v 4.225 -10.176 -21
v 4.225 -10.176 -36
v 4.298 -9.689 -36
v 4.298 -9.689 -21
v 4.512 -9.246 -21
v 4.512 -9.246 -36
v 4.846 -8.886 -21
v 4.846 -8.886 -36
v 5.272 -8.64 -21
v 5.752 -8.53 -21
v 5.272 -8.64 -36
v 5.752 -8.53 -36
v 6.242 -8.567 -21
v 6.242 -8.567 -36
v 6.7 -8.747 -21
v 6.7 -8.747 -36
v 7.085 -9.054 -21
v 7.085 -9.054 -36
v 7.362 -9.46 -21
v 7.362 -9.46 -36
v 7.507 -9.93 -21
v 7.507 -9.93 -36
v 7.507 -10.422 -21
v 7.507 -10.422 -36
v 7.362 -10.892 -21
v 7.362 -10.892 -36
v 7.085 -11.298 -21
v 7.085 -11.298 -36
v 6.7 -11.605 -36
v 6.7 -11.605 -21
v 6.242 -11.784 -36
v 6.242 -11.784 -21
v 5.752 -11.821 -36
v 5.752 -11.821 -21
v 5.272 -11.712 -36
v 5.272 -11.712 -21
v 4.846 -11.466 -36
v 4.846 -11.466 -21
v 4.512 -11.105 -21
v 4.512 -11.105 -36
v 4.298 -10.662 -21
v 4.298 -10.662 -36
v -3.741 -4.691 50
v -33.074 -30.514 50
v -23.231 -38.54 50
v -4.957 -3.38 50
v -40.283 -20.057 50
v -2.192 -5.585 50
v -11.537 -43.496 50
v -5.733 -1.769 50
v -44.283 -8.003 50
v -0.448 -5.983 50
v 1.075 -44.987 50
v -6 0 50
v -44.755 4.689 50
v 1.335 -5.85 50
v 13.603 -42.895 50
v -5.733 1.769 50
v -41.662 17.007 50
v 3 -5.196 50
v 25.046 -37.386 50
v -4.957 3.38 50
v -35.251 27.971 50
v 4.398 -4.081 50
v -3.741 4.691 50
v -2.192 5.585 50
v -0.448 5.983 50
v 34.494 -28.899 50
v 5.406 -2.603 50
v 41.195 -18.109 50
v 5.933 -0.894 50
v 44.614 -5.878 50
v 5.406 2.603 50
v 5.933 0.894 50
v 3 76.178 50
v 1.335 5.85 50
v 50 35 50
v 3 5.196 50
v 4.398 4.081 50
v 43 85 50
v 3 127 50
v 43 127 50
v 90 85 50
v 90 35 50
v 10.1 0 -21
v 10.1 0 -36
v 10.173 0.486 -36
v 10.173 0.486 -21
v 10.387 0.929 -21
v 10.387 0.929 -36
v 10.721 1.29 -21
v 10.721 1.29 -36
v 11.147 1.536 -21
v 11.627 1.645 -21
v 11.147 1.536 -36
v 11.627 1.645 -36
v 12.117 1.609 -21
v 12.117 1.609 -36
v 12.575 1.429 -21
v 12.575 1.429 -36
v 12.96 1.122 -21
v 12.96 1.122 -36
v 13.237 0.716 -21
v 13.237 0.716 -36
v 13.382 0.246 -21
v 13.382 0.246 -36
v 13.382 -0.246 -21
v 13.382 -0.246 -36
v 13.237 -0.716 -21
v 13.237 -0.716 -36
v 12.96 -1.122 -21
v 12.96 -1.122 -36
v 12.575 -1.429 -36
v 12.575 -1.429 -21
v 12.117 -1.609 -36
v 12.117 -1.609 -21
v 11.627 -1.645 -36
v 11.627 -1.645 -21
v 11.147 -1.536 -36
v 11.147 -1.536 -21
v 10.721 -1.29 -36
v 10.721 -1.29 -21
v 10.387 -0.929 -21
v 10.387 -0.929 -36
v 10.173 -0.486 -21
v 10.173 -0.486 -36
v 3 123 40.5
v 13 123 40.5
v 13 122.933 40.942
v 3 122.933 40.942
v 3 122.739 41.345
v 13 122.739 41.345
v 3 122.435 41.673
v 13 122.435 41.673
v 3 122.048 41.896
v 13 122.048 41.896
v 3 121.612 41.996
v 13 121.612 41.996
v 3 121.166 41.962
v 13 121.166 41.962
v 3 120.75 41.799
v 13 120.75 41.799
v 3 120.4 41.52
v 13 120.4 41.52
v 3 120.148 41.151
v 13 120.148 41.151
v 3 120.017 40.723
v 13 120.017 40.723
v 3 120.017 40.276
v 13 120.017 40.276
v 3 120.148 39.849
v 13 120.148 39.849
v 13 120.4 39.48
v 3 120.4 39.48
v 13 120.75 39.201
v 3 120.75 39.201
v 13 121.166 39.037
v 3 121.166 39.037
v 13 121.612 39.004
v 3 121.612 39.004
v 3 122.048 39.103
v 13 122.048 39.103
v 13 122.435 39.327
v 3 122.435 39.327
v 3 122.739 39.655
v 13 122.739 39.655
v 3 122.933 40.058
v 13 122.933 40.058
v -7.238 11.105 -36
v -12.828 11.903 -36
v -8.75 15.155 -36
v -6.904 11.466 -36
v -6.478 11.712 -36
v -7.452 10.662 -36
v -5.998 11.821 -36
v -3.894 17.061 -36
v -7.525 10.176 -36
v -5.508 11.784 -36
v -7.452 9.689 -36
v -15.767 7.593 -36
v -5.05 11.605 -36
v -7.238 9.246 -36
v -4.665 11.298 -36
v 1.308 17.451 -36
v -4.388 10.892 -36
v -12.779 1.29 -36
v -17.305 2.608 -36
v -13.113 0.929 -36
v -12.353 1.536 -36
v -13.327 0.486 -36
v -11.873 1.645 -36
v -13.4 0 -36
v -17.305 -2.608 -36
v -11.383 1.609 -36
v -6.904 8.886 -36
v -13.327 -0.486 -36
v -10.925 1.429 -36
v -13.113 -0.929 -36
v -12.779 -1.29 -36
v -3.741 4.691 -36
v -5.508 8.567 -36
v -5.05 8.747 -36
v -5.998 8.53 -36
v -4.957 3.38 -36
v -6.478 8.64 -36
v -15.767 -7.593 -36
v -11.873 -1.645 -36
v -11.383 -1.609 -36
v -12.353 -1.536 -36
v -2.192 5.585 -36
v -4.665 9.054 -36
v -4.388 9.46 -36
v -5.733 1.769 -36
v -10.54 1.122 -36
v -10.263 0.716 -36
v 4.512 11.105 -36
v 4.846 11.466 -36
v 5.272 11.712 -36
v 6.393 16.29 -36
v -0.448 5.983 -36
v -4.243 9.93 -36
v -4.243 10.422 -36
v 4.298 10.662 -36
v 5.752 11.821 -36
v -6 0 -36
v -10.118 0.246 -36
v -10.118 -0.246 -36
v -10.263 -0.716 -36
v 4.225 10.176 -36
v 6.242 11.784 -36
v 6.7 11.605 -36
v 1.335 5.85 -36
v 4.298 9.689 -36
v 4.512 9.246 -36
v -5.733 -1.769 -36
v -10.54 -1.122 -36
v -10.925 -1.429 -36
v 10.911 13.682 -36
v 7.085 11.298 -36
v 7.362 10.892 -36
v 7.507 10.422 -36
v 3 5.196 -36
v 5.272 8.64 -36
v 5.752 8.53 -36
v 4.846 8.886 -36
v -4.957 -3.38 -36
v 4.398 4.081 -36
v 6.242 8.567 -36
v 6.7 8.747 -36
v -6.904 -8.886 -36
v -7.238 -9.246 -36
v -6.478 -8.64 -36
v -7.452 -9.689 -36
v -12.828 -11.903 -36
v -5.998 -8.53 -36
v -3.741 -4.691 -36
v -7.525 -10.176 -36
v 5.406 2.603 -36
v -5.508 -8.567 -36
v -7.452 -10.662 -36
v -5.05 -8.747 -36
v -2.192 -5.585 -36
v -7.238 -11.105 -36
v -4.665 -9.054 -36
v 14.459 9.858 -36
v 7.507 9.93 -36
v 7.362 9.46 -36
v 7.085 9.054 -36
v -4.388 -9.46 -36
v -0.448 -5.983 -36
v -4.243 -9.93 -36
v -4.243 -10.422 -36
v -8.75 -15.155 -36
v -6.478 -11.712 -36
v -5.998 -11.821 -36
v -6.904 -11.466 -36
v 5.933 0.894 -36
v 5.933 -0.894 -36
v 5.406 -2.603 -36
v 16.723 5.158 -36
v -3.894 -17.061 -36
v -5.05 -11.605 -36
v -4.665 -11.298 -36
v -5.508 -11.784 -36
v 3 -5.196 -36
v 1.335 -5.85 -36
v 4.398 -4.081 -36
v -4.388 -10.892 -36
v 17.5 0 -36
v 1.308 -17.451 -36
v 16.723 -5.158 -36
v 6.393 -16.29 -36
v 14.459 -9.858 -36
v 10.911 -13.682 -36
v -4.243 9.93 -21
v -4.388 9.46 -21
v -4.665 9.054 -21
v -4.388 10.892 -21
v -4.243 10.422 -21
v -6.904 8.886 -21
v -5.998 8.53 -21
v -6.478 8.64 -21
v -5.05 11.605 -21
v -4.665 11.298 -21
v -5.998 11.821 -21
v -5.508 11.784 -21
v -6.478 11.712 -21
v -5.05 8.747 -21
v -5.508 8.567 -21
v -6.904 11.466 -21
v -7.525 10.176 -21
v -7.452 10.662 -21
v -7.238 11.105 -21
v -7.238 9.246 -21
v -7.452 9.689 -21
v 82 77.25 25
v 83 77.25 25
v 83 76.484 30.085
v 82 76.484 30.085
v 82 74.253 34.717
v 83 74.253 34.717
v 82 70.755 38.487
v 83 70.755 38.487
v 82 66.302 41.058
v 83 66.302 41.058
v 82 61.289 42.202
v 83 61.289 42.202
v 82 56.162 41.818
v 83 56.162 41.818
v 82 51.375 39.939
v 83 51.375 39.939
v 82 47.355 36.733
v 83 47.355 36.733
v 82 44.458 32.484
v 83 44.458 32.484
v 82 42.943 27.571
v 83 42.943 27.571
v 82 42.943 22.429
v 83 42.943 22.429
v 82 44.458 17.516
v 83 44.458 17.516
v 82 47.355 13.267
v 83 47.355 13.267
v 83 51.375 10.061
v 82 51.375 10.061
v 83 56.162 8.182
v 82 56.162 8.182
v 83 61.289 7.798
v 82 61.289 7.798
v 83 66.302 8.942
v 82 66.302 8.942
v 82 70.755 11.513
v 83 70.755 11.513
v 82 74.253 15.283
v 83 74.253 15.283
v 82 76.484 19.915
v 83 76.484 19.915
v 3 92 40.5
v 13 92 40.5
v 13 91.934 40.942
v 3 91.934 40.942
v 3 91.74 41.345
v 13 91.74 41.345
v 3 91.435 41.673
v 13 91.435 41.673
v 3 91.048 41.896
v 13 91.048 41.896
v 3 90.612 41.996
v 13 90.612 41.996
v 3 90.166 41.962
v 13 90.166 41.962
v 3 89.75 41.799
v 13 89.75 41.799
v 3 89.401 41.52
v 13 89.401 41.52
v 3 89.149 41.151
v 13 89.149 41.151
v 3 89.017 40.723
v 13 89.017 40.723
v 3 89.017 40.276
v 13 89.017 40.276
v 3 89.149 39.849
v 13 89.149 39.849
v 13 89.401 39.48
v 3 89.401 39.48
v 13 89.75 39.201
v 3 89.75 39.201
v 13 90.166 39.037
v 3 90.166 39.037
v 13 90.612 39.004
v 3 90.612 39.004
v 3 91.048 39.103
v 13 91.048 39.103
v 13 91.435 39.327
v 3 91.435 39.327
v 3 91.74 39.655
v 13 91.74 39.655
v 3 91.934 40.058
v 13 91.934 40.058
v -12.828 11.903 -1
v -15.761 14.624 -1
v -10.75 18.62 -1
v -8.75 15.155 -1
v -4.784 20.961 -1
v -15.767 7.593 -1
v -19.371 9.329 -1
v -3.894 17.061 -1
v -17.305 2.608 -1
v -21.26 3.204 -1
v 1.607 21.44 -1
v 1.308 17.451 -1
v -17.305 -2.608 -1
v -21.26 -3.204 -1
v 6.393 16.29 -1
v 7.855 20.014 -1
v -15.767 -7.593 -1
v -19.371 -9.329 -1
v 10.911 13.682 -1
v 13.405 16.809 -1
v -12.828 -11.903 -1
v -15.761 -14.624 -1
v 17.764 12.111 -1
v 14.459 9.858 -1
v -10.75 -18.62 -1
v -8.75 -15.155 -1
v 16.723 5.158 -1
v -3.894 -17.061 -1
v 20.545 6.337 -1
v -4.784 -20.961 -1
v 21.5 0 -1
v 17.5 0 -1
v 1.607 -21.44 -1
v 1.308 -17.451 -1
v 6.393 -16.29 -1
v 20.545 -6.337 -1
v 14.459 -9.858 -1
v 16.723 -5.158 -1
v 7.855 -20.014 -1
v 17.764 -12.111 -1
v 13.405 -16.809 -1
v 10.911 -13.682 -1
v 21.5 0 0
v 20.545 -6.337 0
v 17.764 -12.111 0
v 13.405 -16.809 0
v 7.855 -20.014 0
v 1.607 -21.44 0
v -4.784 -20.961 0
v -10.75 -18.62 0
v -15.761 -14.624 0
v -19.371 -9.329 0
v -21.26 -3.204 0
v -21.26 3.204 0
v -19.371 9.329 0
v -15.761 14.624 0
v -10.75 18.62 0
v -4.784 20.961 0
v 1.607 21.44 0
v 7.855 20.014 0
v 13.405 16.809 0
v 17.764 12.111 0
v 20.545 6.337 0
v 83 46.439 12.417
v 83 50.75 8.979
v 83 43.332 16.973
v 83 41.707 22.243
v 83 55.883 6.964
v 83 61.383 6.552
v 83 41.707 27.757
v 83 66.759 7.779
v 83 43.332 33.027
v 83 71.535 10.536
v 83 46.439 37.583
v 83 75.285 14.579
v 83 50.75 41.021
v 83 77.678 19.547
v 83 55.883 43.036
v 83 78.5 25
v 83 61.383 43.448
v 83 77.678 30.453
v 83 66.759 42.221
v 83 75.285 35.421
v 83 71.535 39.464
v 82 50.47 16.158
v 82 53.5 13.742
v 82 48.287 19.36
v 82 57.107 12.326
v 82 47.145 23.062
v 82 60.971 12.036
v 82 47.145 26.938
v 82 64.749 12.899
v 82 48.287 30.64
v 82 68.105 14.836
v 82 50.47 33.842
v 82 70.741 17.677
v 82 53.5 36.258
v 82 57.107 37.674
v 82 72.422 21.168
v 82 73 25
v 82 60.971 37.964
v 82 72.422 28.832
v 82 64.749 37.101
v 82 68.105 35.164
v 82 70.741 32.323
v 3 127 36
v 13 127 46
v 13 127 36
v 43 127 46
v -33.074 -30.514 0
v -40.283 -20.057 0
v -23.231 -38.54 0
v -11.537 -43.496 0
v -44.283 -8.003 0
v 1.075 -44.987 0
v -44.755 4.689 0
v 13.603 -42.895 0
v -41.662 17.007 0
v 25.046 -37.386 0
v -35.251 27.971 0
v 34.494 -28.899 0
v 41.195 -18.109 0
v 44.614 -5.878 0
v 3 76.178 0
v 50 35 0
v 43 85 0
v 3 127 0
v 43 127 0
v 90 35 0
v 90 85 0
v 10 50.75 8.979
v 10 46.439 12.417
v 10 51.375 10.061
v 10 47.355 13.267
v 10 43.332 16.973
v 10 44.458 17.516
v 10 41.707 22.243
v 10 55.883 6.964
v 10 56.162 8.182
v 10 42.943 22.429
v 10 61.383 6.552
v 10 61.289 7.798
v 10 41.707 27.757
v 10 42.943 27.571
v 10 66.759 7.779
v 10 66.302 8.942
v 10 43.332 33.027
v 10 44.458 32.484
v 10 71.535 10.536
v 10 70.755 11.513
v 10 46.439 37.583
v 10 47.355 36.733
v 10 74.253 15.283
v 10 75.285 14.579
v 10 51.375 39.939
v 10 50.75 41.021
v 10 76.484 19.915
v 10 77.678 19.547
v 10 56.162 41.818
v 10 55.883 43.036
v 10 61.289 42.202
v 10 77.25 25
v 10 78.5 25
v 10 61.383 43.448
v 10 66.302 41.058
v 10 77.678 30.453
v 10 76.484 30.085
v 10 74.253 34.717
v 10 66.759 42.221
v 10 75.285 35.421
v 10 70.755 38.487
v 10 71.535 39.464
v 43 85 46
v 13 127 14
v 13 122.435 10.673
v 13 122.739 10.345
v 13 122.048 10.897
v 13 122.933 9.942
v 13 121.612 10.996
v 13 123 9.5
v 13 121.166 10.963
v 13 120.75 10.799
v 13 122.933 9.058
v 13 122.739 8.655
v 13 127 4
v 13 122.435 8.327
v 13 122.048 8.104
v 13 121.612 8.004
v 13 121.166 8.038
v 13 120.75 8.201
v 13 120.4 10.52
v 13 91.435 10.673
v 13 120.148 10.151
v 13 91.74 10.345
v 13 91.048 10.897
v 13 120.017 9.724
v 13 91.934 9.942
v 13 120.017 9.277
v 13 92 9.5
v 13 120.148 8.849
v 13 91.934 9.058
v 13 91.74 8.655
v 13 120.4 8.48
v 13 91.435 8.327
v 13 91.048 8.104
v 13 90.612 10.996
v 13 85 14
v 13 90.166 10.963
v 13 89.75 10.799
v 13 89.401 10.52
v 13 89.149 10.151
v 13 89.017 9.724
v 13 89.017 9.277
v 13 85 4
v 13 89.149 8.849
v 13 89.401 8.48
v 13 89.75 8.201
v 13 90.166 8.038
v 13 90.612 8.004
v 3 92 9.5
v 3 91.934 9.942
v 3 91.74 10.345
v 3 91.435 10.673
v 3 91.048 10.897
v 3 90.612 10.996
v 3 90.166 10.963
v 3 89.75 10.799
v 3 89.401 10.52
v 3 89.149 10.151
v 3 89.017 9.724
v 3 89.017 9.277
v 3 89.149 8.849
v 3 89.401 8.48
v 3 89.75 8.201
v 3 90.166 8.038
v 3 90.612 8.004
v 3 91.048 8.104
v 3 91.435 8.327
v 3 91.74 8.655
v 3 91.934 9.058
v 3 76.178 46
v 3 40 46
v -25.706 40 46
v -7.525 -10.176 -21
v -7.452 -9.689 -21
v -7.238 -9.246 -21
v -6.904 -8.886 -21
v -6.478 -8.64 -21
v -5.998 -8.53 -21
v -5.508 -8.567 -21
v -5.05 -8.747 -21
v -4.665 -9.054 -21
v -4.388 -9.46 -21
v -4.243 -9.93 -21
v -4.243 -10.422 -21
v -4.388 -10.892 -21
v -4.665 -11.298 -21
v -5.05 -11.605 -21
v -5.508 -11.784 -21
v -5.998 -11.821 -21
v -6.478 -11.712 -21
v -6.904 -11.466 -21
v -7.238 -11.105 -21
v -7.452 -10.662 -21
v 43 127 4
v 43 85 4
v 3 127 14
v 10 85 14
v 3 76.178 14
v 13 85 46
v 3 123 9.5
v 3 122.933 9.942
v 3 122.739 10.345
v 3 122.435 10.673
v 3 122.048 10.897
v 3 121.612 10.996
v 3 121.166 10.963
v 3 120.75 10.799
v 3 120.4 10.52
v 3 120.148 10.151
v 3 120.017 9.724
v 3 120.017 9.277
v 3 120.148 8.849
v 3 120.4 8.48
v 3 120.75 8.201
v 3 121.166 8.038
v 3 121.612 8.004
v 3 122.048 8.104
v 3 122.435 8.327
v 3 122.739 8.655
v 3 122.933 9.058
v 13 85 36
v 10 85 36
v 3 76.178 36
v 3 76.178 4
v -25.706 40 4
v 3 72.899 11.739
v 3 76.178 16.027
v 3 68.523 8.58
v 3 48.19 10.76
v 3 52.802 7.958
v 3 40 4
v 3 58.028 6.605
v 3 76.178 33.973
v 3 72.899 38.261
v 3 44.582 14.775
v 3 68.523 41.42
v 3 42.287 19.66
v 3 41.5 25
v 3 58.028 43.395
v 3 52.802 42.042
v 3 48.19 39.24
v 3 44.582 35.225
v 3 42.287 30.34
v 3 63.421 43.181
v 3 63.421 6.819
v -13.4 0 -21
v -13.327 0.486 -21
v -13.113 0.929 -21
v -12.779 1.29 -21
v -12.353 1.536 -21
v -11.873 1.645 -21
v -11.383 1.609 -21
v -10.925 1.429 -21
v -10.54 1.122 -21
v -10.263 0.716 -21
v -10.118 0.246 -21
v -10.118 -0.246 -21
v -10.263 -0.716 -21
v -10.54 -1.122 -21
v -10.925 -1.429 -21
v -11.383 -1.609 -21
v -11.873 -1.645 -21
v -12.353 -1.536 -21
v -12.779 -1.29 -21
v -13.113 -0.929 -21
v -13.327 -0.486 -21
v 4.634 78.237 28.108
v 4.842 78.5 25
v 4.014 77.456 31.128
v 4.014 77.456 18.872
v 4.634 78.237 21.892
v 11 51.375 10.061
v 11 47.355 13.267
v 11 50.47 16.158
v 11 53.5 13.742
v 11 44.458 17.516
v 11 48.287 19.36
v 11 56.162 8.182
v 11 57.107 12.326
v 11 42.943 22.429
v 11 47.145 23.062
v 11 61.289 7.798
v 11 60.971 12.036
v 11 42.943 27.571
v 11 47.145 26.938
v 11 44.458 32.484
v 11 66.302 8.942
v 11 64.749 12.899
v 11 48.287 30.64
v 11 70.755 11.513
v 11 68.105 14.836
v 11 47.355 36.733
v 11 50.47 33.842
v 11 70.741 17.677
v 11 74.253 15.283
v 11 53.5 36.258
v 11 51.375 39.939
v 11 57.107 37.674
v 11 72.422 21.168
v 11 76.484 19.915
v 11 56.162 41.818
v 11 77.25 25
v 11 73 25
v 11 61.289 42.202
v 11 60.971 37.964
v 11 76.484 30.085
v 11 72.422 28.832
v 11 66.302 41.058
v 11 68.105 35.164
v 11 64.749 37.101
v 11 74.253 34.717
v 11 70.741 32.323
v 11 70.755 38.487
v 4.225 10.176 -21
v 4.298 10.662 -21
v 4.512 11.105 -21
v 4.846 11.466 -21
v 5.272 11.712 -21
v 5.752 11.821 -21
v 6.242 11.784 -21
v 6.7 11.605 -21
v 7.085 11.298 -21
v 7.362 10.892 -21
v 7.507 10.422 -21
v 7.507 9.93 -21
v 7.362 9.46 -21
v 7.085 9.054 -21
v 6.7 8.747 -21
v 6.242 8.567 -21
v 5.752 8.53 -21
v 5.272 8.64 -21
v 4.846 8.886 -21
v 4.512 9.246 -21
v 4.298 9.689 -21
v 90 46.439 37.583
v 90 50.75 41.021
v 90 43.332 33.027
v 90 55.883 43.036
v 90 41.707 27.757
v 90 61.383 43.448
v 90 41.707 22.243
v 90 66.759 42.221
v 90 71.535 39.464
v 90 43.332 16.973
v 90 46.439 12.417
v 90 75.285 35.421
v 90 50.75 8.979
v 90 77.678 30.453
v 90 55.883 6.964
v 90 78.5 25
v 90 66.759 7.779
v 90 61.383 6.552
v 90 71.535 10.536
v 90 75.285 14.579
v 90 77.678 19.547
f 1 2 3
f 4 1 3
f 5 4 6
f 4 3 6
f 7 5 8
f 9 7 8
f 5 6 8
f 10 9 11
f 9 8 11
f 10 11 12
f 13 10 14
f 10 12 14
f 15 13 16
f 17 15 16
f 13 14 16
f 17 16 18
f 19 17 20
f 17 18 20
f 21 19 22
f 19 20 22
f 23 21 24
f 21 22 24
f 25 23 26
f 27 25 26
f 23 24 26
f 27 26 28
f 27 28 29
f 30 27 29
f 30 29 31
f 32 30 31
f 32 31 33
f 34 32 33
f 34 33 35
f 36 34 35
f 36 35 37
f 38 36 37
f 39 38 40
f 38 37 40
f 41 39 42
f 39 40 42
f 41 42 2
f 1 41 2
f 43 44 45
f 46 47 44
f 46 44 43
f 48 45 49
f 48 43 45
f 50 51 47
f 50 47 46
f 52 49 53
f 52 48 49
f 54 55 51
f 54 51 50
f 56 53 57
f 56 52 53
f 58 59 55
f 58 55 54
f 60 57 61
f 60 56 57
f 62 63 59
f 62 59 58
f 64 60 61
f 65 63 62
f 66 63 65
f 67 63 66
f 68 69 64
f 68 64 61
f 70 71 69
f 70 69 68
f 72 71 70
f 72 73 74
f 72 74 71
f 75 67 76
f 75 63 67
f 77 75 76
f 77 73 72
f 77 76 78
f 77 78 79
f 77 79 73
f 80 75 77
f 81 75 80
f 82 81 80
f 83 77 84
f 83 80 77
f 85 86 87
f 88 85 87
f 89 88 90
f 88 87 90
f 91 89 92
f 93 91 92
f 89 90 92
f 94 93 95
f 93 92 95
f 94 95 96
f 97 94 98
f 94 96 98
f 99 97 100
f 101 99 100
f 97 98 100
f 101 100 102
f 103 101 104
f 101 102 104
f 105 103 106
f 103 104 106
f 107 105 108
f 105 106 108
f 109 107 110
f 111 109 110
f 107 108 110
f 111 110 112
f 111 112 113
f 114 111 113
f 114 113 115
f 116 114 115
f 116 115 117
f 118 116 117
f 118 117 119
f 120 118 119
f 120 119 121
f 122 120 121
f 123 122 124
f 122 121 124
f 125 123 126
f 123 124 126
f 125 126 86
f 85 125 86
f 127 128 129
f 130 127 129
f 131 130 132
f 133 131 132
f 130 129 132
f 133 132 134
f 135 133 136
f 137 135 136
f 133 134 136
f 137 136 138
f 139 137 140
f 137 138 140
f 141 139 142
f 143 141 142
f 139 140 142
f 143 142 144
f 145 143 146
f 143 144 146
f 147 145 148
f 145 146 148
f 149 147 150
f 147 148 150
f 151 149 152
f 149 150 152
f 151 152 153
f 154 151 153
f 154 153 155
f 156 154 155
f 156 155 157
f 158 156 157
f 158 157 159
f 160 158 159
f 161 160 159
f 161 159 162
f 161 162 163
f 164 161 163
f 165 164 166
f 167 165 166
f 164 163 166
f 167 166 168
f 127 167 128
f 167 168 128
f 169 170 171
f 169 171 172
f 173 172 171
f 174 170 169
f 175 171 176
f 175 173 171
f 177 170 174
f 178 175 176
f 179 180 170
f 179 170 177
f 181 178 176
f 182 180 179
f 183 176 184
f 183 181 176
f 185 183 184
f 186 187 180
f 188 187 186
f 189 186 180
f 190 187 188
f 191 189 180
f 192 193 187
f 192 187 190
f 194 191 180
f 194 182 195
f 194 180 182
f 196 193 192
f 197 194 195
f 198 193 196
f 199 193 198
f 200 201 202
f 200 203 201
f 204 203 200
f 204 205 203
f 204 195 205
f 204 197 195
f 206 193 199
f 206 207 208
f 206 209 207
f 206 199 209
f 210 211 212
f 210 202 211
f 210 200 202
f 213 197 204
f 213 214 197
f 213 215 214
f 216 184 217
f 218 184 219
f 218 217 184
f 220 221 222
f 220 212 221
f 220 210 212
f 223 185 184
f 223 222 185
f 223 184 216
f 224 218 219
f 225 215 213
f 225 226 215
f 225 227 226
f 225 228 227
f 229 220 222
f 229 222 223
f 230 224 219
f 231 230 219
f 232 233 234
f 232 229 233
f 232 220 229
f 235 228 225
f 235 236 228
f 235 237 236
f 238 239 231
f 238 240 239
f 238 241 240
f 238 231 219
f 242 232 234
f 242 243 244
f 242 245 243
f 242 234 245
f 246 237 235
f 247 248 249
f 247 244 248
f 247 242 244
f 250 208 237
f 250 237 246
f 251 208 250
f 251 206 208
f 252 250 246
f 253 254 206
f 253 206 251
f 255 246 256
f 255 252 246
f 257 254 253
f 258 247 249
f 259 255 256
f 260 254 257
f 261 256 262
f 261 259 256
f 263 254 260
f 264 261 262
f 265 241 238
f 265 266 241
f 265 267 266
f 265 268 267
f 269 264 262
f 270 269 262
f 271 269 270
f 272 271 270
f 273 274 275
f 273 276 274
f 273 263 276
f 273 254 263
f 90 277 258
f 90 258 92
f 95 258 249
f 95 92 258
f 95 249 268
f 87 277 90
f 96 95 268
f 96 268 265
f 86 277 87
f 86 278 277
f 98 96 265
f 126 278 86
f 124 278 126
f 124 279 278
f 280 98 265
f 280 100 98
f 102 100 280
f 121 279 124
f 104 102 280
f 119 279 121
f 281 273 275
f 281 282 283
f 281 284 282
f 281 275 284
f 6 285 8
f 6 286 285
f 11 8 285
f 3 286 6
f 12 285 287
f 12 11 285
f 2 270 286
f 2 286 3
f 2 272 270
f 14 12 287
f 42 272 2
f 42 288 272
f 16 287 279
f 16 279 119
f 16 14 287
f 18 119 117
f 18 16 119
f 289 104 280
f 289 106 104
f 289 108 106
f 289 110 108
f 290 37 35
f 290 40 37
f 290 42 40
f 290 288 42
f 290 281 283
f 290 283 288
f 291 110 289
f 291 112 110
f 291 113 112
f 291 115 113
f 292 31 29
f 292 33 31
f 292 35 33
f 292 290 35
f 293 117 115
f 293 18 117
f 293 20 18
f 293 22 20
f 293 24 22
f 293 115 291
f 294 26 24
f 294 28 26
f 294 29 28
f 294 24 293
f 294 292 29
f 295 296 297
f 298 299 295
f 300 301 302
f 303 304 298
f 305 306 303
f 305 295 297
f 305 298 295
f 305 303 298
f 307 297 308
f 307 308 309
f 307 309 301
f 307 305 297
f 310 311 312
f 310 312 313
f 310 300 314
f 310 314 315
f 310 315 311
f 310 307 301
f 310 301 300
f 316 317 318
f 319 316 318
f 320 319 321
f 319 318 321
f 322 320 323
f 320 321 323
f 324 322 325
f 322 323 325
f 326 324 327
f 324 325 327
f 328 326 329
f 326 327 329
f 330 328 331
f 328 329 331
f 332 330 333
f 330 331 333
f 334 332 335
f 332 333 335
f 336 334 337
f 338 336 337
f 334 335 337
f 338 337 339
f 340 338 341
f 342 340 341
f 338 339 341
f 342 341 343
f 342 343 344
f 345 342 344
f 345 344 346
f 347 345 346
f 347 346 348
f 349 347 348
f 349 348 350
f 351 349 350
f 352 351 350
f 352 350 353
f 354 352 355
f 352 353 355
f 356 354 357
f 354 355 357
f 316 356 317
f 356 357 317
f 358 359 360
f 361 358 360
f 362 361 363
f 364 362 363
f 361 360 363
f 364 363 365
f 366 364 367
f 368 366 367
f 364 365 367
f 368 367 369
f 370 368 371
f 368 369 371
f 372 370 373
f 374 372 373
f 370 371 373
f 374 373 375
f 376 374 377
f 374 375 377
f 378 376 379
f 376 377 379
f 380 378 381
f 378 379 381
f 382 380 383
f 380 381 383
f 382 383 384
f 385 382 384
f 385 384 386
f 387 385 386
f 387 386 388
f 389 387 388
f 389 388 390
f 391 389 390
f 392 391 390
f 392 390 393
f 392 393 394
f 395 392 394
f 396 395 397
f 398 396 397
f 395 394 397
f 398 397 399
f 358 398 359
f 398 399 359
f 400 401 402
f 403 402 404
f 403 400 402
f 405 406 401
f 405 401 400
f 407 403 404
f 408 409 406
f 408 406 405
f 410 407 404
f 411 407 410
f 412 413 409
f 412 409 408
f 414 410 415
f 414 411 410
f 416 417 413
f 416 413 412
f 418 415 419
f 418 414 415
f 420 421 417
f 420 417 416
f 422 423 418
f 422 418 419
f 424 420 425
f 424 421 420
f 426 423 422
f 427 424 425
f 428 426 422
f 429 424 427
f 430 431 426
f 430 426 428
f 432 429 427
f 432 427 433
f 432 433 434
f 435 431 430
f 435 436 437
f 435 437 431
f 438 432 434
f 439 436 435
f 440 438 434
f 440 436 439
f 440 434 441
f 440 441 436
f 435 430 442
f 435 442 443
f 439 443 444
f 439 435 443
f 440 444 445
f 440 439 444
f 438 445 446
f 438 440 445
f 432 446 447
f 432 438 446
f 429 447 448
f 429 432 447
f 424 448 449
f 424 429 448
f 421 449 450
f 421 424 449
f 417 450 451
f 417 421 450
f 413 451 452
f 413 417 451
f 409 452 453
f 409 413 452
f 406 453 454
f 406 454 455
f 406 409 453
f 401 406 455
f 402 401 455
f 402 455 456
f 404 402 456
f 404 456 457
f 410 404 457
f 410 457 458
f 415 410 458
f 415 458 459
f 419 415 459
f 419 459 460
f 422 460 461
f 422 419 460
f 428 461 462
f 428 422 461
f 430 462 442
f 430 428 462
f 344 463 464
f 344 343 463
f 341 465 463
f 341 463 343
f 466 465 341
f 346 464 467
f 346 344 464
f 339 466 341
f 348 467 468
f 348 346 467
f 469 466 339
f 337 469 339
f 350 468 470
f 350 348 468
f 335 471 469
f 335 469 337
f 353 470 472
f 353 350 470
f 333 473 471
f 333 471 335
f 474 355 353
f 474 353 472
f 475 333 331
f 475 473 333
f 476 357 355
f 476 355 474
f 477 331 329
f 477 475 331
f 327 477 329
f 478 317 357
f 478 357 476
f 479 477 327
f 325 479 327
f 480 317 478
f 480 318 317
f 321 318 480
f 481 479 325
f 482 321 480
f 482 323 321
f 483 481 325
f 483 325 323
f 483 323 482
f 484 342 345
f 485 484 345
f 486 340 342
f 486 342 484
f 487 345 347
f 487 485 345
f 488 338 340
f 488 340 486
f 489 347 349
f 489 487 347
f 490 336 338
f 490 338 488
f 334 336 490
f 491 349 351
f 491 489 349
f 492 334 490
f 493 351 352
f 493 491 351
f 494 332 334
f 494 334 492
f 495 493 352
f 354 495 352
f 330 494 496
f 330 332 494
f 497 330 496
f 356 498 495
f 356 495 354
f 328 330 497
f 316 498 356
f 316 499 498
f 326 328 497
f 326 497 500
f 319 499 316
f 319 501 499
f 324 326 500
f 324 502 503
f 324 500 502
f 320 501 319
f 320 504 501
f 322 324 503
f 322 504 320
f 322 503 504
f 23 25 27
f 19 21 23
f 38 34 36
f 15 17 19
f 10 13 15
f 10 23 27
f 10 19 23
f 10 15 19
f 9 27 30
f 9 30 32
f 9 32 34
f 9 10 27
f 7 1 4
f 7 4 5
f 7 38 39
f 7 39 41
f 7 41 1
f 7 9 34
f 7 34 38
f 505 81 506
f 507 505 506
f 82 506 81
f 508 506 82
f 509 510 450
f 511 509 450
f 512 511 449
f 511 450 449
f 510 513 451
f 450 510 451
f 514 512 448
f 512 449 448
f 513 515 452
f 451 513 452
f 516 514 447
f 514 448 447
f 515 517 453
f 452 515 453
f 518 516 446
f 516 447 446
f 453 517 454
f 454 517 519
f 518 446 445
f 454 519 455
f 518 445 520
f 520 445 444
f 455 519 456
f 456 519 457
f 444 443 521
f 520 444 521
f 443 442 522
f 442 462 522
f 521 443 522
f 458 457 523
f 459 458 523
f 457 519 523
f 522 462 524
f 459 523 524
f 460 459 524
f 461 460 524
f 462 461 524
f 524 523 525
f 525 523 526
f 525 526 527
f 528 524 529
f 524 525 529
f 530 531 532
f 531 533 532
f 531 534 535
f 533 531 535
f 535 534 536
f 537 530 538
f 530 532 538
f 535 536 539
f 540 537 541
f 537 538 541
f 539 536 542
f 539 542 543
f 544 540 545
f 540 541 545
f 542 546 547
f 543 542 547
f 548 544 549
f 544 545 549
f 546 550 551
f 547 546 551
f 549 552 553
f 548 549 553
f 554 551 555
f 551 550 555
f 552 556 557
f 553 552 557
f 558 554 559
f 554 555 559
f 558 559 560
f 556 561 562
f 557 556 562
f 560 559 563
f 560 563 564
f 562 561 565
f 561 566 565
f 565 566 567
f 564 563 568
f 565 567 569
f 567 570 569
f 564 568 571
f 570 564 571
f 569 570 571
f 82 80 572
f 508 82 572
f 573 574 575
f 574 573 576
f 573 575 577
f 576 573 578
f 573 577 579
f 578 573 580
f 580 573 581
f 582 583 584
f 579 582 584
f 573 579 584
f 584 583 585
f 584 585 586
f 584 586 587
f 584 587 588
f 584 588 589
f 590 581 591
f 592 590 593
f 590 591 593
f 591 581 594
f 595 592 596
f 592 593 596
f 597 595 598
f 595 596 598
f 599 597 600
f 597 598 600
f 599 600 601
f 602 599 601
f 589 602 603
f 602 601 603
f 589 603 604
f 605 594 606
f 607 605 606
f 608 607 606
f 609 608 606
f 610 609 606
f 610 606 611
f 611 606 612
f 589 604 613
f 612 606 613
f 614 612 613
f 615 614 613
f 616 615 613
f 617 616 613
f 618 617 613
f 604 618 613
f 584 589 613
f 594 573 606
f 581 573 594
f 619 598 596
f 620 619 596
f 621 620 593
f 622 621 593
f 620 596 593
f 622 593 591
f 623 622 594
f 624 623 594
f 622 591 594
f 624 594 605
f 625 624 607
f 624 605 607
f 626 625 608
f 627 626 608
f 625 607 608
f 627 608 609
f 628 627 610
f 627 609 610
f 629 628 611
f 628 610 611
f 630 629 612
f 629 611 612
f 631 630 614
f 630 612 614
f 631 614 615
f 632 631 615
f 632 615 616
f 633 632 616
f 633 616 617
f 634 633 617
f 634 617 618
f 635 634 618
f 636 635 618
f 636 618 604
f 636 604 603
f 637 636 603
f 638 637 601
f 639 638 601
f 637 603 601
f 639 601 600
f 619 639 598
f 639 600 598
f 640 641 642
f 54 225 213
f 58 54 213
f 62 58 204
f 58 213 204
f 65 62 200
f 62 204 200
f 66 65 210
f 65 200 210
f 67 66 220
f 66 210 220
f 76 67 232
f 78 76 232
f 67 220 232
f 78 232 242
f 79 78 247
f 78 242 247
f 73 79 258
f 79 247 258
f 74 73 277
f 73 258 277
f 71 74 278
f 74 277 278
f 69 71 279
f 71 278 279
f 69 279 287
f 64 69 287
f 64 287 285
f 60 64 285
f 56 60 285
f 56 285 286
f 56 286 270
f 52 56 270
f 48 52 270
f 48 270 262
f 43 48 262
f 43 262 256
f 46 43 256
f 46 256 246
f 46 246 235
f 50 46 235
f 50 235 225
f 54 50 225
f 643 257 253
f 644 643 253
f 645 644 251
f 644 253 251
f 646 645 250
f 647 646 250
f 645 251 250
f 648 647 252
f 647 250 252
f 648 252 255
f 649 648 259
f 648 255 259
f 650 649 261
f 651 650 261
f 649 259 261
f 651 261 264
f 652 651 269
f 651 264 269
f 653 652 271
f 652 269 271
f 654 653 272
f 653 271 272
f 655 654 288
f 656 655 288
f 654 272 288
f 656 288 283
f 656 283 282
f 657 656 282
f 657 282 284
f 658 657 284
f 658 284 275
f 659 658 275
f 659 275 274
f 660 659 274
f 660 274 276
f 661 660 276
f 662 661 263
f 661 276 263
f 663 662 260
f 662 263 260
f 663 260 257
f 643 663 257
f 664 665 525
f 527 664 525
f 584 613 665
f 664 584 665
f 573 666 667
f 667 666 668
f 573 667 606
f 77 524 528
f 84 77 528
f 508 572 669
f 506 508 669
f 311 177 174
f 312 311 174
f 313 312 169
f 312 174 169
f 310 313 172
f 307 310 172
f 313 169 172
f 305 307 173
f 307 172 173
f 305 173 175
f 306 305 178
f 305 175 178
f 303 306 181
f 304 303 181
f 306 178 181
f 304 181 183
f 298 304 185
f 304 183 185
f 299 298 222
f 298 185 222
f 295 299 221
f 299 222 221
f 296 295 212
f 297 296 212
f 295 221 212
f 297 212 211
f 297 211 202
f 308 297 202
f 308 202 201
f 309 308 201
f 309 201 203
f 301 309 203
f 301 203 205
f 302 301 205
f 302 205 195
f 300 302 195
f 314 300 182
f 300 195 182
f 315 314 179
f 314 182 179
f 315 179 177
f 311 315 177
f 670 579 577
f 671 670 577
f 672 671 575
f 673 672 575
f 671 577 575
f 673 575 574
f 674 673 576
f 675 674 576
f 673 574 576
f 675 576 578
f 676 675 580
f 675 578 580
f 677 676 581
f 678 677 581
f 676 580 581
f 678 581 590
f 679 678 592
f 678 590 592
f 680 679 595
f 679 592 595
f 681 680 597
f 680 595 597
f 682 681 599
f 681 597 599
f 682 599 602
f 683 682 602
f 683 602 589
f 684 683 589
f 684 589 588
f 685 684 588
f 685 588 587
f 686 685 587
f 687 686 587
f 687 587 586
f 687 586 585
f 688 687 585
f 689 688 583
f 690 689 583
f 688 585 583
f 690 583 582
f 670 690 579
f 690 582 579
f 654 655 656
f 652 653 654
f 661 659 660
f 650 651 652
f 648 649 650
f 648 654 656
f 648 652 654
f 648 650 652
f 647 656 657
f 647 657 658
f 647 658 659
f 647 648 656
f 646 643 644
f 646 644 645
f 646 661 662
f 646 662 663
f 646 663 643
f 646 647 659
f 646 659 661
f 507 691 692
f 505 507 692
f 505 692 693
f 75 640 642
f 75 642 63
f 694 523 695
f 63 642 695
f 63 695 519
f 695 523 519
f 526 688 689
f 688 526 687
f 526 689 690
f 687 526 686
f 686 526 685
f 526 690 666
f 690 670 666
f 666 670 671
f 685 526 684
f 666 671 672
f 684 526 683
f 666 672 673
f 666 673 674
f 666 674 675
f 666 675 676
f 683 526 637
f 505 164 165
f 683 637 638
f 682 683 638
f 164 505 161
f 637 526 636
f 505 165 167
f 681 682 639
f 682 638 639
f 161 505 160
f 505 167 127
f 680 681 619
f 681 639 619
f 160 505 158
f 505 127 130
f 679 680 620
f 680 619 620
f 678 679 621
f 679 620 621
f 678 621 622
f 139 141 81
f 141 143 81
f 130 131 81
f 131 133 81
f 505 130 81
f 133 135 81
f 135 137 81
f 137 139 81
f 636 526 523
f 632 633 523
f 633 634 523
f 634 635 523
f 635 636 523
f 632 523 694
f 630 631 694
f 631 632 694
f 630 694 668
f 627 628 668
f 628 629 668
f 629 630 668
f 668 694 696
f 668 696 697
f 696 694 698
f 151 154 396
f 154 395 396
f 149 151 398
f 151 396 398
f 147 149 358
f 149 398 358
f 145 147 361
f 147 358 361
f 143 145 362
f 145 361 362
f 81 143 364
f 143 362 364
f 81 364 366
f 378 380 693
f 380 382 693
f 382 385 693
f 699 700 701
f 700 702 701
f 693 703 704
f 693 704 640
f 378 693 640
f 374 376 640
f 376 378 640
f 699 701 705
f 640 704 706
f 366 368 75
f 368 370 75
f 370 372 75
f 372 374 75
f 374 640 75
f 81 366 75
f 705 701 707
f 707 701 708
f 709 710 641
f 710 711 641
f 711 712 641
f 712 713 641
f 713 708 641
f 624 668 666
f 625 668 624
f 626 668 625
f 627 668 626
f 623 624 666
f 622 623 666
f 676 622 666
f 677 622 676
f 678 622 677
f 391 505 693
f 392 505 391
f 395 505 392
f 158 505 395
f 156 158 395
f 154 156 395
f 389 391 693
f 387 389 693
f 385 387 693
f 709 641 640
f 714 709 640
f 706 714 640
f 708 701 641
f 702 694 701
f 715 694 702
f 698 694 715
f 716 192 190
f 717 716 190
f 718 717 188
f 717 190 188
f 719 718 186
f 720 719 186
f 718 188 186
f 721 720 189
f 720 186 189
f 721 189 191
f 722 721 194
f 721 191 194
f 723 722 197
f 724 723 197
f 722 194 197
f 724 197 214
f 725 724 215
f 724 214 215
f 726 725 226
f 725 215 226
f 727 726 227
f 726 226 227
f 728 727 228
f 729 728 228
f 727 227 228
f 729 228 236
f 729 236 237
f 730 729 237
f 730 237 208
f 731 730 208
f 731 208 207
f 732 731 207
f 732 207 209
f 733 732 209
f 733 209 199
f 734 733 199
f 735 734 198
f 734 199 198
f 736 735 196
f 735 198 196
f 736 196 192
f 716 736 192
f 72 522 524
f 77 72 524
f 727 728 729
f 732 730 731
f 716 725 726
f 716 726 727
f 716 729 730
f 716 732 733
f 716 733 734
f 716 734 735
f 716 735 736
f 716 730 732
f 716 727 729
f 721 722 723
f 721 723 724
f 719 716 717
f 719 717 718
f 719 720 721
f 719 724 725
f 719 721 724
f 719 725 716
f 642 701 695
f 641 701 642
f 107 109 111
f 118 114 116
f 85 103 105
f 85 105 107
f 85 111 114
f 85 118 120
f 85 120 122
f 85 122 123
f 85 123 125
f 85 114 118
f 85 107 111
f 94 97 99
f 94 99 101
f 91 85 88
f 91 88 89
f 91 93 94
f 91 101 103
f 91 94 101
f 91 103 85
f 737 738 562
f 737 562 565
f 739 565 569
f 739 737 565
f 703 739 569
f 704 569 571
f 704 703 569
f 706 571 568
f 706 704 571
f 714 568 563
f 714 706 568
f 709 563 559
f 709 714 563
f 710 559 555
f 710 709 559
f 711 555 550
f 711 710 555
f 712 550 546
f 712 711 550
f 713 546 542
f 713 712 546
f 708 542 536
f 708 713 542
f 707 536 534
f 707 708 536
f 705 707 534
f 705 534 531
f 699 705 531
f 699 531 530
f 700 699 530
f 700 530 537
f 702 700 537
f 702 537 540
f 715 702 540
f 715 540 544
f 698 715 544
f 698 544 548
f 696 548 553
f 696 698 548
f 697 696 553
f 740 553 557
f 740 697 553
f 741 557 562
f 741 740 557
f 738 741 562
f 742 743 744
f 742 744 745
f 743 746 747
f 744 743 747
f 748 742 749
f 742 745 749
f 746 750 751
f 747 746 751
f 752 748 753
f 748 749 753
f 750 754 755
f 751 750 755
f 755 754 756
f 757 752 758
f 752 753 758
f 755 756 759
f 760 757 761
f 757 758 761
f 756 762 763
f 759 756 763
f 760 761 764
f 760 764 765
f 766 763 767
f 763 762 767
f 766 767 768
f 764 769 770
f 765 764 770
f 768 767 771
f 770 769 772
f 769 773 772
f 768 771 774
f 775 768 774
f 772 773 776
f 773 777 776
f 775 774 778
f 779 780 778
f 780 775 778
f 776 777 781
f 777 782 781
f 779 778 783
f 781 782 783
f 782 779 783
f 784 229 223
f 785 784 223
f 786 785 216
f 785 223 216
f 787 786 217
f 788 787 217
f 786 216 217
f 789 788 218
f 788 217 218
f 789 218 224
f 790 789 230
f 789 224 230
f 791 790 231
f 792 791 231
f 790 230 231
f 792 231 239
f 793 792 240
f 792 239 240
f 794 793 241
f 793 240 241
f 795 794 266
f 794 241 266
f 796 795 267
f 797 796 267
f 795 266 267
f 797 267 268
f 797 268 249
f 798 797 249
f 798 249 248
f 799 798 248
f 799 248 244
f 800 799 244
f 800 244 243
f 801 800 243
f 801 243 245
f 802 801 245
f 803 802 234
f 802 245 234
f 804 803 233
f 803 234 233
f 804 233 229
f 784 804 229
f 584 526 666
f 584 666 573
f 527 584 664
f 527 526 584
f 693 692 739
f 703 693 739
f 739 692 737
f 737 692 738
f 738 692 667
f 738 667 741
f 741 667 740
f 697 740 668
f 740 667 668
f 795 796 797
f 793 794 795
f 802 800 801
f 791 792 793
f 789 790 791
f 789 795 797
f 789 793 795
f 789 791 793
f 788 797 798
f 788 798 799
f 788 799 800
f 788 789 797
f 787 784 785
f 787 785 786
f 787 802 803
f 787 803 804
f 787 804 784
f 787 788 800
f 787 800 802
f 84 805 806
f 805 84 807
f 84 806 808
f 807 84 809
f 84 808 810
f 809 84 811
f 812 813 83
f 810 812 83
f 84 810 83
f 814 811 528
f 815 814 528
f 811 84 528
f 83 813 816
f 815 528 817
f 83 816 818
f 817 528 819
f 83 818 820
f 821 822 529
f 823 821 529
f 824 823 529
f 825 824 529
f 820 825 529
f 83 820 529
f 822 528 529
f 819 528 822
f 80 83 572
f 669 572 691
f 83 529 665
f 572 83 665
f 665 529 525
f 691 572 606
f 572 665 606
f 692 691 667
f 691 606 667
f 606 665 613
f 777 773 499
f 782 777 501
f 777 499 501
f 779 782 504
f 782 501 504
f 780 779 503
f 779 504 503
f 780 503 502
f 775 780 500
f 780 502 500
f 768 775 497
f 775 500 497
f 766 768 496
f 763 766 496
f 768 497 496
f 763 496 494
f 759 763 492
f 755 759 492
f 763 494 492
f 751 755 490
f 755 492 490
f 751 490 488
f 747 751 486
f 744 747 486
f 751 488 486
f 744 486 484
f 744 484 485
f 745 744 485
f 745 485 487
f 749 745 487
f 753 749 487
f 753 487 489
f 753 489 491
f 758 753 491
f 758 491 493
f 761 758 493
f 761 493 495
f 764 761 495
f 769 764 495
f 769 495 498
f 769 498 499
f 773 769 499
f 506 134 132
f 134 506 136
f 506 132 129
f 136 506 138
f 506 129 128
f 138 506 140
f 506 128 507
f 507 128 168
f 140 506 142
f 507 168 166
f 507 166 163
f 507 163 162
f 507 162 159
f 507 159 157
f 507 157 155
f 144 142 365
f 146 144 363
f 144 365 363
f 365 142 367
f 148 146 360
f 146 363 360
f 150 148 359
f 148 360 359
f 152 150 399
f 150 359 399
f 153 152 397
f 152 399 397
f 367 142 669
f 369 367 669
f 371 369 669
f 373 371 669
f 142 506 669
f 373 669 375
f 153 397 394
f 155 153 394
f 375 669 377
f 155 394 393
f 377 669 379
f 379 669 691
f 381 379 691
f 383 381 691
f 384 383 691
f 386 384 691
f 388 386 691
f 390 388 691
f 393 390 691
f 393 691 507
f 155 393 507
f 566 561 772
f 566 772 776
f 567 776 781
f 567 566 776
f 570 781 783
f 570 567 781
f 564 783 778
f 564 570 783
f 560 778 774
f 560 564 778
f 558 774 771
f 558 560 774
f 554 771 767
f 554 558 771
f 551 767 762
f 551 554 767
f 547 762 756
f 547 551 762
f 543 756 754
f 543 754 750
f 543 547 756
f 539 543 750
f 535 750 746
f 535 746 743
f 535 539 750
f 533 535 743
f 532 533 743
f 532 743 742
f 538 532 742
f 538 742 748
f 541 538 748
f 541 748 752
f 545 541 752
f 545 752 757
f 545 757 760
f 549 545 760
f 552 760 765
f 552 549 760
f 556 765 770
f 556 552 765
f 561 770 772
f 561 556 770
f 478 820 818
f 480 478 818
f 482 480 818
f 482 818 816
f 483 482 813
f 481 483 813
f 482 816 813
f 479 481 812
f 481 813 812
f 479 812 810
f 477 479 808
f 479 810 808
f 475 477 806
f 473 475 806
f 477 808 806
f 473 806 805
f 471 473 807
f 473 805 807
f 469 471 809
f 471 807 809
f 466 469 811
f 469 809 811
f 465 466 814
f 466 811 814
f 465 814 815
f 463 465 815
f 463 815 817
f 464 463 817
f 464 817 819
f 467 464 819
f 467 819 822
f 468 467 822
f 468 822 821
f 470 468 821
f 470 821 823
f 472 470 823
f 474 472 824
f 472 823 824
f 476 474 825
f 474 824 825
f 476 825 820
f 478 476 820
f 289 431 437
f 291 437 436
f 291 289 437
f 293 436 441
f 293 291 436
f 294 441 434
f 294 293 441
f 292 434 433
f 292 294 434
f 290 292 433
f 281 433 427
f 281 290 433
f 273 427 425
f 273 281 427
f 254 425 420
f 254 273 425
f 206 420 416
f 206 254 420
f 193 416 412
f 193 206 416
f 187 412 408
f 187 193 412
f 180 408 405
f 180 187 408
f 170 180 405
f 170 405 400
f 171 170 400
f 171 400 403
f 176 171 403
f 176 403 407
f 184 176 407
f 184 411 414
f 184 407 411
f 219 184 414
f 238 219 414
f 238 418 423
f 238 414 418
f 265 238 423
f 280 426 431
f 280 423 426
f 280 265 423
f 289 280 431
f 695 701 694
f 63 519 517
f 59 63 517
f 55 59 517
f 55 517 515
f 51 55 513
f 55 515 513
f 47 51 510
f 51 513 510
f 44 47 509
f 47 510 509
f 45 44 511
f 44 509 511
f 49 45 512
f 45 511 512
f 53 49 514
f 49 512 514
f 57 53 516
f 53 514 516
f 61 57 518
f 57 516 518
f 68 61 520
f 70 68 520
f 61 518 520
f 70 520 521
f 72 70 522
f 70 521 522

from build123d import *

# Parameters (mm, degrees)
SKETCH1_W                       = 40
SKETCH1_H                       = 50
SKETCH1_R                       = 45
BOSS_EXTRUDE1_DEPTH             = 50
SKETCH3_R                       = 13
CUT_EXTRUDE1_DEPTH              = 130
BOSS_EXTRUDE3_DEPTH             = 42
BOSS_EXTRUDE3_DEPTH_BACK        = 10
SKETCH6_W                       = 7
SKETCH6_H                       = 4
SKETCH6_H_2                     = 10
SKETCH6_W_2                     = 3
CUT_EXTRUDE2_DEPTH              = 11
CUT_EXTRUDE2_DEPTH_BACK         = 43
SKETCH5_W                       = 42
SKETCH5_H                       = 40
SKETCH9_R                       = 1.5
CUT_EXTRUDE4_DEPTH              = 10
SKIZZE1_R                       = 6
SCHNITT_LINEAR_AUSTRAGEN1_DEPTH = 50
AUFSATZ_LINEAR_START            = 36
SKIZZE2_R                       = 17.5
SKIZZE2_R_2                     = 6
AUFSATZ_LINEAR_AUSTRAGEN1_DEPTH = 36
AUFSATZ_LINEAR_START_2          = 1
SKIZZE3_R                       = 21.5
SKIZZE3_R_2                     = 17.5
AUFSATZ_LINEAR_AUSTRAGEN2_DEPTH = 1
SKIZZE4_R                       = 1.65
SCHNITT_LINEAR_AUSTRAGEN2_DEPTH = 15
SKIZZE5_R                       = 18.5
SCHNITT_LINEAR_AUSTRAGEN3_DEPTH = 7
SKIZZE6_R                       = 17.25
SCHNITT_LINEAR_AUSTRAGEN4_DEPTH = 1


with BuildPart() as part:
    # Sketch1 → Boss-Extrude1 (new body)
    with BuildSketch(Plane.XY):
        with Locations((70, 60)):
            Rectangle(SKETCH1_W, SKETCH1_H)
        with BuildLine():
            Line((44.614473451, -5.877819215), (50, 35))
            Line((50, 35), (50, 85))
            Line((50, 85), (10, 85))
            Line((10, 85), (-35.25108577, 27.970715973))
            ThreePointArc((-35.25108577, 27.970715973), (14.810488519, 42.492933881), (45, 0))
            ThreePointArc((45, 0), (44.903514925, -2.945224501), (44.614473451, -5.877819215))
        make_face()
        Circle(SKETCH1_R)
    extrude(amount=BOSS_EXTRUDE1_DEPTH)

    # Sketch3 → Cut-Extrude1 (cut)
    with BuildSketch(Plane(origin=(90, 0, 0), x_dir=(0, 0, -1), z_dir=(1, 0, 0))):
        with Locations(Location((-25, 60, 0), (0, 0, 90))):
            Circle(SKETCH3_R)
    extrude(amount=-CUT_EXTRUDE1_DEPTH, mode=Mode.SUBTRACT)

    # Sketch6 → Boss-Extrude3 (add, two sides: drawn at the far end of the back side and taken through both)
    with BuildSketch(Plane(origin=(0, 85, 0), x_dir=(1, 0, 0), z_dir=(0, 1, 0)).offset(-BOSS_EXTRUDE3_DEPTH_BACK)):
        Polygon((43, -4), (43, 0), (10, 0), (10, -4), (13, -4), align=None)
        with Locations((6.5, -2)):
            Rectangle(SKETCH6_W, SKETCH6_H)
        with Locations((6.5, -9)):
            Rectangle(SKETCH6_W, SKETCH6_H_2)
        with Locations((11.5, -9)):
            Rectangle(SKETCH6_W_2, SKETCH6_H_2)
        with Locations((11.5, -41)):
            Rectangle(SKETCH6_W_2, SKETCH6_H_2)
        with Locations((6.5, -41)):
            Rectangle(SKETCH6_W, SKETCH6_H_2)
        with Locations((6.5, -48)):
            Rectangle(SKETCH6_W, SKETCH6_H)
        Polygon((13, -46), (10, -46), (10, -50), (43, -50), (43, -46), align=None)
    extrude(amount=BOSS_EXTRUDE3_DEPTH + BOSS_EXTRUDE3_DEPTH_BACK)

    # Sketch5 → Cut-Extrude2 (cut, two sides: drawn at the far end of the back side and taken through both)
    with BuildSketch(Plane.ZY.offset(40).offset(-CUT_EXTRUDE2_DEPTH_BACK)):
        with Locations((25, 60)):
            Rectangle(SKETCH5_W, SKETCH5_H)
    extrude(amount=CUT_EXTRUDE2_DEPTH + CUT_EXTRUDE2_DEPTH_BACK, mode=Mode.SUBTRACT)

    # Sketch9 → Cut-Extrude4 (cut)
    with BuildSketch(Plane(origin=(13, 0, 0), x_dir=(0, 0, -1), z_dir=(1, 0, 0))):
        with Locations(Location((-9.500219356, 121.499780644, 0), (0, 0, 90))):
            Circle(SKETCH9_R)
        with Locations(Location((-9.500219356, 90.500219356, 0), (0, 0, 90))):
            Circle(SKETCH9_R)
        with Locations(Location((-40.499780644, 90.500219356, 0), (0, 0, 90))):
            Circle(SKETCH9_R)
        with Locations(Location((-40.499780644, 121.499780644, 0), (0, 0, 90))):
            Circle(SKETCH9_R)
    extrude(amount=-CUT_EXTRUDE4_DEPTH, mode=Mode.SUBTRACT)

    # Skizze1 → Schnitt-Linear austragen1 (cut)
    with BuildSketch(Plane(origin=(0, 0, 0), x_dir=(-1, 0, 0), z_dir=(0, 0, -1))):
        Circle(SKIZZE1_R)
    extrude(amount=-SCHNITT_LINEAR_AUSTRAGEN1_DEPTH, mode=Mode.SUBTRACT)

    # Skizze2 → Aufsatz-Linear austragen1 (add)
    with BuildSketch(Plane(origin=(0, 0, 0), x_dir=(-1, 0, 0), z_dir=(0, 0, -1)).offset(AUFSATZ_LINEAR_START)):
        with Locations(Location((0, 0, 0), (0, 0, 180))):
            Circle(SKIZZE2_R)
        Circle(SKIZZE2_R_2, mode=Mode.SUBTRACT)
    extrude(amount=-AUFSATZ_LINEAR_AUSTRAGEN1_DEPTH)

    # Skizze3 → Aufsatz-Linear austragen2 (add)
    with BuildSketch(Plane(origin=(0, 0, 0), x_dir=(-1, 0, 0), z_dir=(0, 0, -1)).offset(AUFSATZ_LINEAR_START_2)):
        with Locations(Location((0, 0, 0), (0, 0, 180))):
            Circle(SKIZZE3_R)
        Circle(SKIZZE3_R_2, mode=Mode.SUBTRACT)
    extrude(amount=-AUFSATZ_LINEAR_AUSTRAGEN2_DEPTH)

    # Skizze4 → Schnitt-Linear austragen2 (cut)
    with BuildSketch(Plane(origin=(0, 0, -36), x_dir=(-1, 0, 0), z_dir=(0, 0, -1))):
        with Locations((-11.75, 0)):
            Circle(SKIZZE4_R)
        with Locations((-5.875, 10.175798494)):
            Circle(SKIZZE4_R)
        with Locations((5.875, 10.175798494)):
            Circle(SKIZZE4_R)
        with Locations((11.75, 0)):
            Circle(SKIZZE4_R)
        with Locations((5.875, -10.175798494)):
            Circle(SKIZZE4_R)
        with Locations((-5.875, -10.175798494)):
            Circle(SKIZZE4_R)
    extrude(amount=-SCHNITT_LINEAR_AUSTRAGEN2_DEPTH, mode=Mode.SUBTRACT)

    # Skizze5 → Schnitt-Linear austragen3 (cut)
    with BuildSketch(Plane(origin=(90, 0, 0), x_dir=(0, 0, -1), z_dir=(1, 0, 0))):
        with Locations(Location((-25, 60, 0), (0, 0, 90))):
            Circle(SKIZZE5_R)
    schnitt_linear_austragen3 = extrude(amount=-SCHNITT_LINEAR_AUSTRAGEN3_DEPTH, mode=Mode.SUBTRACT)

    # Skizze6 → Schnitt-Linear austragen4 (cut)
    with BuildSketch(Plane(origin=(83, 0, 0), x_dir=(0, 0, -1), z_dir=(1, 0, 0))):
        with Locations(Location((-25, 60, 0), (0, 0, 90))):
            Circle(SKIZZE6_R)
    schnitt_linear_austragen4 = extrude(amount=-SCHNITT_LINEAR_AUSTRAGEN4_DEPTH, mode=Mode.SUBTRACT)

    # Spiegeln1: Schnitt-Linear austragen3, Schnitt-Linear austragen4 across plane
    add(schnitt_linear_austragen3.mirror(Plane(origin=(46.5, 0, 0), x_dir=(0, 0, 1), z_dir=(1, 0, 0))), mode=Mode.SUBTRACT)
    add(schnitt_linear_austragen4.mirror(Plane(origin=(46.5, 0, 0), x_dir=(0, 0, 1), z_dir=(1, 0, 0))), mode=Mode.SUBTRACT)


solid = part.part
